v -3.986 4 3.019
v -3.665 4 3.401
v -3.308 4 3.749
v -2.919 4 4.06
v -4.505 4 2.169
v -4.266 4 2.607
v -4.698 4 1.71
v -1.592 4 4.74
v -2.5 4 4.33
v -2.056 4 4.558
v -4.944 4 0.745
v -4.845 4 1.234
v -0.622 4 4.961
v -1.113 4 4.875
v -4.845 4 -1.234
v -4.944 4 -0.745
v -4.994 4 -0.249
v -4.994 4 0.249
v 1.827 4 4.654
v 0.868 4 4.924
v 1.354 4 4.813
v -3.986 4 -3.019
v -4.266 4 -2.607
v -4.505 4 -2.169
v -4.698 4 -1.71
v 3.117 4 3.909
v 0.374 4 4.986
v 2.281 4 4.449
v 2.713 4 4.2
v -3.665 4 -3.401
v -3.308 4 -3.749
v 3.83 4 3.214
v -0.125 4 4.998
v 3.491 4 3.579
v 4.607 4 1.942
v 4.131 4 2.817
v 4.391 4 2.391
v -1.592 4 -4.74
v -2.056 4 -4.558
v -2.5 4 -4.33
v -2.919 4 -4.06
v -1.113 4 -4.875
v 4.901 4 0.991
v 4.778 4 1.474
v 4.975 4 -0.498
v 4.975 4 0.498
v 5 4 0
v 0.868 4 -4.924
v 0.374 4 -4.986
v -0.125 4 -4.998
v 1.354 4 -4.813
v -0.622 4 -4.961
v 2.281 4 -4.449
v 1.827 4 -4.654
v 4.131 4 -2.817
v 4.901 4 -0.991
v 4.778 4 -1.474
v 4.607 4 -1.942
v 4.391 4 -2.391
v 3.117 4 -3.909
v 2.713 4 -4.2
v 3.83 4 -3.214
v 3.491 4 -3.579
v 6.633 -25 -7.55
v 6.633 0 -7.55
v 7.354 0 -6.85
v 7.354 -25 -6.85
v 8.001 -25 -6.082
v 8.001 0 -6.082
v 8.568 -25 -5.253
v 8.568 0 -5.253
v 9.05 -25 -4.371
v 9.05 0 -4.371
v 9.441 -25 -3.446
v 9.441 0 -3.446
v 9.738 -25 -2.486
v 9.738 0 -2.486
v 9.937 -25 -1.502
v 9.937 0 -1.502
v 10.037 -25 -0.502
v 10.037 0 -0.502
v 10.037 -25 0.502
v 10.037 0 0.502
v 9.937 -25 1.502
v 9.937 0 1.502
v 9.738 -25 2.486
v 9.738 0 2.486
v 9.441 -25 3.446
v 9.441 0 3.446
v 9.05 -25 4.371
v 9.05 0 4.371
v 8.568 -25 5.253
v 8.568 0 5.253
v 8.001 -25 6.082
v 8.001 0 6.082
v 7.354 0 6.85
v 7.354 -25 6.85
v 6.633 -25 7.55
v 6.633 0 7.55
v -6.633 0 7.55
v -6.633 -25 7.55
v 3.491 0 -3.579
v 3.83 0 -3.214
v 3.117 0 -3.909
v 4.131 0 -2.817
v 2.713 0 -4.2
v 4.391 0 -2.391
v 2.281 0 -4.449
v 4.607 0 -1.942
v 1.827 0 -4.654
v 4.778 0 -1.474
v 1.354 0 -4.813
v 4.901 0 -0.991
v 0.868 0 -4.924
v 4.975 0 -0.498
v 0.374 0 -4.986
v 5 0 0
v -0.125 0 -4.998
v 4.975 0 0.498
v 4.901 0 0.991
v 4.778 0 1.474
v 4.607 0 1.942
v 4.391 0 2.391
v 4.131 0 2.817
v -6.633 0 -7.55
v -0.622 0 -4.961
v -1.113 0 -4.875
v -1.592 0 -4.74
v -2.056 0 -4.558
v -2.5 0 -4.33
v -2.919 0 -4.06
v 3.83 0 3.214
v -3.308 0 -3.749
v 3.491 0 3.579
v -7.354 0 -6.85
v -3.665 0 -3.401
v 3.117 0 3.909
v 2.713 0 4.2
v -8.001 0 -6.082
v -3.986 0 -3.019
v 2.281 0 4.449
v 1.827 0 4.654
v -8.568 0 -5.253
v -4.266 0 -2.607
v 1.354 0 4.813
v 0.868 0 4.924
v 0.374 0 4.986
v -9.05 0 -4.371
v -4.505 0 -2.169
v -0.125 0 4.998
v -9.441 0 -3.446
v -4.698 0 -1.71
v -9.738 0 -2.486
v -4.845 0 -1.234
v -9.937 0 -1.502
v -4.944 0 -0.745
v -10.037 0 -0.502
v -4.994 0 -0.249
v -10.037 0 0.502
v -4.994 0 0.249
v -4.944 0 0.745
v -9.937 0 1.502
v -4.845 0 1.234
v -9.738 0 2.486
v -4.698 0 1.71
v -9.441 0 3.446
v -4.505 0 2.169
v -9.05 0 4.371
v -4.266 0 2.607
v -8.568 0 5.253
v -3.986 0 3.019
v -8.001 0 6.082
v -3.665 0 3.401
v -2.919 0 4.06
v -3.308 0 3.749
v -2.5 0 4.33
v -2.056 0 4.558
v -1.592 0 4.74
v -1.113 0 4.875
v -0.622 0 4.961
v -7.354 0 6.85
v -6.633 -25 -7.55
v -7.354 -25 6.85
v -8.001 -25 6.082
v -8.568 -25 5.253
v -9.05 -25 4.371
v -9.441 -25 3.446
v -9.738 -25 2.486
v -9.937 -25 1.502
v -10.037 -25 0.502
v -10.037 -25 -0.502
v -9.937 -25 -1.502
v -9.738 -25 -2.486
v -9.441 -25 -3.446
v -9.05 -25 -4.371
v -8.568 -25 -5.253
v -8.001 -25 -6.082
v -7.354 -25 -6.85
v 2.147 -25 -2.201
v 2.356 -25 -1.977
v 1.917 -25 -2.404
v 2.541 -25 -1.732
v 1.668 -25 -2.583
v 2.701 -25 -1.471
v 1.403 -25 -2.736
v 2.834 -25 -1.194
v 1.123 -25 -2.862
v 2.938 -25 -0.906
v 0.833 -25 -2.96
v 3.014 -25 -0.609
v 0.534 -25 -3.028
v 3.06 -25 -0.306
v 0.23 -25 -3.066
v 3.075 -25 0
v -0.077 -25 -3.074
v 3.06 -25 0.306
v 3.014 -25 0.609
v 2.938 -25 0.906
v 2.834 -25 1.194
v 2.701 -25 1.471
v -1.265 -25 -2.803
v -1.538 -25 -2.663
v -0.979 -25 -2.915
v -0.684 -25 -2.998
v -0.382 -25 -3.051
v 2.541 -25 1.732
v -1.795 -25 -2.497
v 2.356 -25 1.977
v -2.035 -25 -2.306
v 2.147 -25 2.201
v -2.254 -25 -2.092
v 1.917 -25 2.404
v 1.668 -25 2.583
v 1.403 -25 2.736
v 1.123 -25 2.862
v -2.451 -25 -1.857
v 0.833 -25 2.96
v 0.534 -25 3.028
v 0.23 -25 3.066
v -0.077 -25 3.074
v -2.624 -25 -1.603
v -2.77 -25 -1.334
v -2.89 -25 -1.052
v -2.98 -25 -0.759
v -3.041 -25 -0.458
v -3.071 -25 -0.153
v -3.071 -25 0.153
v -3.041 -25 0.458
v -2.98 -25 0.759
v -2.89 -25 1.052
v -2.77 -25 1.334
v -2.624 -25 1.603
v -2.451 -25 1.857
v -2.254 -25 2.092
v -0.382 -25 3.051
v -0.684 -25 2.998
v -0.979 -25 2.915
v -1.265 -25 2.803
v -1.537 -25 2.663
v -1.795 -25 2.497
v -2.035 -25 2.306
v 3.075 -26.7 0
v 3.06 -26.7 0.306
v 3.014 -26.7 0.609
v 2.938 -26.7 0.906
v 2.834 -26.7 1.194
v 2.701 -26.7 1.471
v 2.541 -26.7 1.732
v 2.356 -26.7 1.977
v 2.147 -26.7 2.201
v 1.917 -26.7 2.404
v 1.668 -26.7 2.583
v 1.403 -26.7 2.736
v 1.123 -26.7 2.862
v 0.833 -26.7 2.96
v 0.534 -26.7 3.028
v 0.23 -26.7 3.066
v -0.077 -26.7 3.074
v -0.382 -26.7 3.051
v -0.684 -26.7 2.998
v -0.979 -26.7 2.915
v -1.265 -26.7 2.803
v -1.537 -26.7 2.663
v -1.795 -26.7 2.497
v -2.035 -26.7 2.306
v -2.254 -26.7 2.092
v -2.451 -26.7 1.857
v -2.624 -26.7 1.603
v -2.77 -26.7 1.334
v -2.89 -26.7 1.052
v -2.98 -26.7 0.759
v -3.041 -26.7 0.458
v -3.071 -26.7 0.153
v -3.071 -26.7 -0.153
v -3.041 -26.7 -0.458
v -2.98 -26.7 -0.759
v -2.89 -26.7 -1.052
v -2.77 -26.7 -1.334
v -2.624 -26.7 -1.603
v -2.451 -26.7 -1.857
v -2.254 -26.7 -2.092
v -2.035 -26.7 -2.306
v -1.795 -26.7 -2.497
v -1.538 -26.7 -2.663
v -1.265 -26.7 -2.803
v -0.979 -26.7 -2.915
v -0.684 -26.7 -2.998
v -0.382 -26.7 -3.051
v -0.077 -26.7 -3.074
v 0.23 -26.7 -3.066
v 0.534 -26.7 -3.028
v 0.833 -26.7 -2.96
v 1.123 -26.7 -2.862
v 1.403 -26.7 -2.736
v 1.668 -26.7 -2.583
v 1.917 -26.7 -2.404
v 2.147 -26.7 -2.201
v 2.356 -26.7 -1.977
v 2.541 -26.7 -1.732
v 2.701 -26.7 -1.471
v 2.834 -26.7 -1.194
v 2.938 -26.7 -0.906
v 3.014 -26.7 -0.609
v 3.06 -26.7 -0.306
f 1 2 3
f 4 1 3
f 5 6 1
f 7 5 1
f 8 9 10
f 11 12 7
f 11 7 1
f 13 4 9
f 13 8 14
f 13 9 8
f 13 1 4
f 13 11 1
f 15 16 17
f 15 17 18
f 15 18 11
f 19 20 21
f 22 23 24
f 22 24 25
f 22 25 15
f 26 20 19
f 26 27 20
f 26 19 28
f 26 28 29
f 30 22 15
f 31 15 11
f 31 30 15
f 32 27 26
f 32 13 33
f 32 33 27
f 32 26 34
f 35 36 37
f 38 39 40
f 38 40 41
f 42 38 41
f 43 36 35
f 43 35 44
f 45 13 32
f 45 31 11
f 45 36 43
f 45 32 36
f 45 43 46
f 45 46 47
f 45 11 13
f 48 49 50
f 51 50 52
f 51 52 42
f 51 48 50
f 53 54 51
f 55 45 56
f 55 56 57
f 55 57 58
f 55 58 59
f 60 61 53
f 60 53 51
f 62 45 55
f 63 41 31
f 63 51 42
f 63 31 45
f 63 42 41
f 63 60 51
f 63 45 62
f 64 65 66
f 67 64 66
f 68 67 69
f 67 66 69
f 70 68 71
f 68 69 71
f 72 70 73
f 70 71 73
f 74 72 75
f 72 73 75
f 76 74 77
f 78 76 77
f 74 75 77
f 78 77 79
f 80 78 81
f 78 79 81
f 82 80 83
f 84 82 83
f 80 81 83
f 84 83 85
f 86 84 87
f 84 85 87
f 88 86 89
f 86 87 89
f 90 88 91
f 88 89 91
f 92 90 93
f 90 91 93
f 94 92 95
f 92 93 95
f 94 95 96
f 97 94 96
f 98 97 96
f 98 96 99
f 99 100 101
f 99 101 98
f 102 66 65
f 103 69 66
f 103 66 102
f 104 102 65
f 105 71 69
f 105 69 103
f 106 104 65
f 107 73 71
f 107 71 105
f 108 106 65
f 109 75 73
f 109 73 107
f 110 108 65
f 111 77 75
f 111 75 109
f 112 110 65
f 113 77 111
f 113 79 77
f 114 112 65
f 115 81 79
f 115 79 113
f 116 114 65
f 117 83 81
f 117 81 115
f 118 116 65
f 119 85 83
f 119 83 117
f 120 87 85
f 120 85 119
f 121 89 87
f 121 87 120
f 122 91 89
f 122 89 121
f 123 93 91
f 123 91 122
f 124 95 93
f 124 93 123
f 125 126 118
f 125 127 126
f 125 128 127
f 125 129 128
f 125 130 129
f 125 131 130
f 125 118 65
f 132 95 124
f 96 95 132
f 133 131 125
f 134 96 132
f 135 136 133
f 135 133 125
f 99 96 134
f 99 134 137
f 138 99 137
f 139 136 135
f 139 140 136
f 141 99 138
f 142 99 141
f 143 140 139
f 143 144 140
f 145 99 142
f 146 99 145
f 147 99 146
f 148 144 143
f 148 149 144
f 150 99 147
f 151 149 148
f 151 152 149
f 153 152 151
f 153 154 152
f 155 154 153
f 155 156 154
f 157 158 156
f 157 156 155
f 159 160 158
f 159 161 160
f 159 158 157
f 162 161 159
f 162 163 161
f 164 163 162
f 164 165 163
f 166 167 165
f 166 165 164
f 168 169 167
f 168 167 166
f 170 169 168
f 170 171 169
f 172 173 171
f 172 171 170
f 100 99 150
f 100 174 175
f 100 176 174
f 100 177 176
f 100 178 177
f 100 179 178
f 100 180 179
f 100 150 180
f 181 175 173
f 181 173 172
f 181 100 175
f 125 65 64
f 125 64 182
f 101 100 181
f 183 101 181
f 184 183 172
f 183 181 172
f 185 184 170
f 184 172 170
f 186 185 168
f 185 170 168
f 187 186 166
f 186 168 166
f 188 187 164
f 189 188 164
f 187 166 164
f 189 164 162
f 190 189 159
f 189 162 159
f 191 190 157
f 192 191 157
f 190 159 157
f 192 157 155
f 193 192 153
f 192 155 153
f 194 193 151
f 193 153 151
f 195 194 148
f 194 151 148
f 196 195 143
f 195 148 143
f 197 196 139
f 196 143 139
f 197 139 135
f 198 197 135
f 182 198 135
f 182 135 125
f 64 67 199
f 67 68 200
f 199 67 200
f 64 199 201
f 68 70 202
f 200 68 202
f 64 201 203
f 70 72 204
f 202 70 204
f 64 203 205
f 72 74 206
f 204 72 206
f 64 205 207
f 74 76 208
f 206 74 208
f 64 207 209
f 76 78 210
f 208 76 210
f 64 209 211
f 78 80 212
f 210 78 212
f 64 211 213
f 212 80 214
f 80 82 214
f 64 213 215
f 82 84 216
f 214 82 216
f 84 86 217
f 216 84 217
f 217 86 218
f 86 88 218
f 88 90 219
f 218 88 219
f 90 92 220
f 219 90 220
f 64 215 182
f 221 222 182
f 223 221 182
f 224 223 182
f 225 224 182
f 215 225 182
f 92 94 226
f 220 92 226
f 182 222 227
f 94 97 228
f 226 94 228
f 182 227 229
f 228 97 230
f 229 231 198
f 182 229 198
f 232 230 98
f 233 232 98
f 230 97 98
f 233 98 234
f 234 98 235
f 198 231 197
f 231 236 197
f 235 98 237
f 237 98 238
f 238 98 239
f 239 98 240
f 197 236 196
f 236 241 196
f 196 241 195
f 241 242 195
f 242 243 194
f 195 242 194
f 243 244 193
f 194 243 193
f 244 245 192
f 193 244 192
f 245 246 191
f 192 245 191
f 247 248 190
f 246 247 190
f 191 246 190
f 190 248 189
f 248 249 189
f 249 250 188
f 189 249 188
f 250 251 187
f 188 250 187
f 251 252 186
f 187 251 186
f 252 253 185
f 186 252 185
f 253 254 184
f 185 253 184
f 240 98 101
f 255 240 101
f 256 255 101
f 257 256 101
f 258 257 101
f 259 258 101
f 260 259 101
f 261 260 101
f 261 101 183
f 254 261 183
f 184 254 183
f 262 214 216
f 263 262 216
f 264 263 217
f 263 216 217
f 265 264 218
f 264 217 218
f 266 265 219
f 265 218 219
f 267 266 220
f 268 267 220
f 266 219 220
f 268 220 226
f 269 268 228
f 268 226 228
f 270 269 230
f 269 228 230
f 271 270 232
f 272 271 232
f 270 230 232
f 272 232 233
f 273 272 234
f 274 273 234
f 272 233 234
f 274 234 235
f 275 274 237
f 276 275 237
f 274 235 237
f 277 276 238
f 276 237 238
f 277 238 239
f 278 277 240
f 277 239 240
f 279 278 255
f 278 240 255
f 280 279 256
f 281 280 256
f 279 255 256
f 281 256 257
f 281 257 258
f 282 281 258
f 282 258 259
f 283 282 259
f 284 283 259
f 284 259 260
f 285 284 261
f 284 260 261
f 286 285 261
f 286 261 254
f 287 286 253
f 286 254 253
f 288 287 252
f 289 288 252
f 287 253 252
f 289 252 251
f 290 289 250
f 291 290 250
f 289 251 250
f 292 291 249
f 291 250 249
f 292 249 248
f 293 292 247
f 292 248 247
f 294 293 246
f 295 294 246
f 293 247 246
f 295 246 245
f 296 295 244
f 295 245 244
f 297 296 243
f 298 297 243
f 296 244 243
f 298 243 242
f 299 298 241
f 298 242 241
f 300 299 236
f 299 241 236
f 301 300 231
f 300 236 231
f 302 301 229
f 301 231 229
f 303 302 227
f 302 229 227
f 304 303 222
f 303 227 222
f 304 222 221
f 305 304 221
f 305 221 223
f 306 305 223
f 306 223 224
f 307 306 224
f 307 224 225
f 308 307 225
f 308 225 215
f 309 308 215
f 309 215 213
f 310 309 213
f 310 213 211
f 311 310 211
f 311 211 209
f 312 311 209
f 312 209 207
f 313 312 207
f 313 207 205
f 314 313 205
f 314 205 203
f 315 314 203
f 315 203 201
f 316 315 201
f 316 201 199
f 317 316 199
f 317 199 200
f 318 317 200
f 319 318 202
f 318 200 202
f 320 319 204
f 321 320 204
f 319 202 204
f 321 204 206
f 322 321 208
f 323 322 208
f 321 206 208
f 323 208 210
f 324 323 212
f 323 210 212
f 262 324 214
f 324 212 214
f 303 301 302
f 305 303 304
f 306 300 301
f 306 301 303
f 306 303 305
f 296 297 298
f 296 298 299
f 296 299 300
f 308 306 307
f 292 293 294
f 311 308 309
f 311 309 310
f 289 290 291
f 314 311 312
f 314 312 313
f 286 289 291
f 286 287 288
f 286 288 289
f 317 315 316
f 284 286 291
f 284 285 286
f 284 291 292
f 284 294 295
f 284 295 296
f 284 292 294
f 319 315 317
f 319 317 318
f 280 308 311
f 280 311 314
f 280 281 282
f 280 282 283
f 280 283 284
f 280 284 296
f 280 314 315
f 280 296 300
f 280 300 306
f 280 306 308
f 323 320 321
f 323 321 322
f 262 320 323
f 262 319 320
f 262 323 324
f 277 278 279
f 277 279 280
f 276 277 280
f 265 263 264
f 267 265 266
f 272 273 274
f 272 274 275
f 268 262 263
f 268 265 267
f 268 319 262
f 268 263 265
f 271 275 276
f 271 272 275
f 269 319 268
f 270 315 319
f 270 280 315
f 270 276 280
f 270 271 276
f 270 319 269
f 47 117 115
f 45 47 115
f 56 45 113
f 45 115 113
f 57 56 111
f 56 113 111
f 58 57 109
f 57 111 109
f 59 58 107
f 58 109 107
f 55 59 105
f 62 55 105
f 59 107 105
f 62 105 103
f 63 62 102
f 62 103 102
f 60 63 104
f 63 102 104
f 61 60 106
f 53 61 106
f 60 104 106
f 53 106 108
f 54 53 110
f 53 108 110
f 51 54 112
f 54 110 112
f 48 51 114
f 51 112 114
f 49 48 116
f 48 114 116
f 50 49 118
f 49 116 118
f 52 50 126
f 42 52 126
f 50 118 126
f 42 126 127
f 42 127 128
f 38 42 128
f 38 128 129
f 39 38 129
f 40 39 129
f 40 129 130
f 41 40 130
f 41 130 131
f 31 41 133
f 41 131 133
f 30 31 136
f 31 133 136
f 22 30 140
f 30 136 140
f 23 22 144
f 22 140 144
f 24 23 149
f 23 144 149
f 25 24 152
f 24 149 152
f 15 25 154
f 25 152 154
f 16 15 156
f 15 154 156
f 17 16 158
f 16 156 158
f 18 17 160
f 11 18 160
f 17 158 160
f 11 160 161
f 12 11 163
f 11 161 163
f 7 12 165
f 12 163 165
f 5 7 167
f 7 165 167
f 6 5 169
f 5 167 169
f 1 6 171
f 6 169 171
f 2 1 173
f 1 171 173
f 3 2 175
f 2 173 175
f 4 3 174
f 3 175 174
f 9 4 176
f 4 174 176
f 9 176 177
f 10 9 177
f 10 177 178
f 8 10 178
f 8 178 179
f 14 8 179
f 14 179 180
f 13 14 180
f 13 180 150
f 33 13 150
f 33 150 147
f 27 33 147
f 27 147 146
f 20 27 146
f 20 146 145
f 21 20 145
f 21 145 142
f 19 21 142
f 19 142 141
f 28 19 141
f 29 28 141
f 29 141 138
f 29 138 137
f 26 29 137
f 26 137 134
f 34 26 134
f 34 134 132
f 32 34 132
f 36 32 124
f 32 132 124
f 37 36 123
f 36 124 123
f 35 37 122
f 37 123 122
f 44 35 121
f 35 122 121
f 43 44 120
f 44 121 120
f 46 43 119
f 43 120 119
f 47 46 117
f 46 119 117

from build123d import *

# Parameters (mm, degrees)
PAD_DEPTH    = 25
SKETCH001_R  = 3.075
PAD001_DEPTH = 1.7
SKETCH011_R  = 5
PAD009_DEPTH = 4


with BuildPart() as part:
    # Sketch → Pad (new body)
    with BuildSketch(Plane.XZ):
        with BuildLine():
            Line((-6.63325, 7.55), (6.63325, 7.55))
            ThreePointArc((6.63325, -7.55), (10.05, 0), (6.63325, 7.55))
            Line((6.63325, -7.55), (-6.63325, -7.55))
            ThreePointArc((-6.63325, 7.55), (-10.05, 0), (-6.63325, -7.55))
        make_face()
    extrude(amount=PAD_DEPTH)

    # Sketch001 → Pad001 (new body)
    with BuildSketch(Plane.XZ.offset(25)):
        Circle(SKETCH001_R)
    extrude(amount=PAD001_DEPTH)

    # Sketch011 → Pad009 (new body)
    with BuildSketch(Plane(origin=(0, 0, 0), x_dir=(1, 0, 0), z_dir=(0, 1, 0))):
        Circle(SKETCH011_R)
    extrude(amount=PAD009_DEPTH)


solid = part.part
